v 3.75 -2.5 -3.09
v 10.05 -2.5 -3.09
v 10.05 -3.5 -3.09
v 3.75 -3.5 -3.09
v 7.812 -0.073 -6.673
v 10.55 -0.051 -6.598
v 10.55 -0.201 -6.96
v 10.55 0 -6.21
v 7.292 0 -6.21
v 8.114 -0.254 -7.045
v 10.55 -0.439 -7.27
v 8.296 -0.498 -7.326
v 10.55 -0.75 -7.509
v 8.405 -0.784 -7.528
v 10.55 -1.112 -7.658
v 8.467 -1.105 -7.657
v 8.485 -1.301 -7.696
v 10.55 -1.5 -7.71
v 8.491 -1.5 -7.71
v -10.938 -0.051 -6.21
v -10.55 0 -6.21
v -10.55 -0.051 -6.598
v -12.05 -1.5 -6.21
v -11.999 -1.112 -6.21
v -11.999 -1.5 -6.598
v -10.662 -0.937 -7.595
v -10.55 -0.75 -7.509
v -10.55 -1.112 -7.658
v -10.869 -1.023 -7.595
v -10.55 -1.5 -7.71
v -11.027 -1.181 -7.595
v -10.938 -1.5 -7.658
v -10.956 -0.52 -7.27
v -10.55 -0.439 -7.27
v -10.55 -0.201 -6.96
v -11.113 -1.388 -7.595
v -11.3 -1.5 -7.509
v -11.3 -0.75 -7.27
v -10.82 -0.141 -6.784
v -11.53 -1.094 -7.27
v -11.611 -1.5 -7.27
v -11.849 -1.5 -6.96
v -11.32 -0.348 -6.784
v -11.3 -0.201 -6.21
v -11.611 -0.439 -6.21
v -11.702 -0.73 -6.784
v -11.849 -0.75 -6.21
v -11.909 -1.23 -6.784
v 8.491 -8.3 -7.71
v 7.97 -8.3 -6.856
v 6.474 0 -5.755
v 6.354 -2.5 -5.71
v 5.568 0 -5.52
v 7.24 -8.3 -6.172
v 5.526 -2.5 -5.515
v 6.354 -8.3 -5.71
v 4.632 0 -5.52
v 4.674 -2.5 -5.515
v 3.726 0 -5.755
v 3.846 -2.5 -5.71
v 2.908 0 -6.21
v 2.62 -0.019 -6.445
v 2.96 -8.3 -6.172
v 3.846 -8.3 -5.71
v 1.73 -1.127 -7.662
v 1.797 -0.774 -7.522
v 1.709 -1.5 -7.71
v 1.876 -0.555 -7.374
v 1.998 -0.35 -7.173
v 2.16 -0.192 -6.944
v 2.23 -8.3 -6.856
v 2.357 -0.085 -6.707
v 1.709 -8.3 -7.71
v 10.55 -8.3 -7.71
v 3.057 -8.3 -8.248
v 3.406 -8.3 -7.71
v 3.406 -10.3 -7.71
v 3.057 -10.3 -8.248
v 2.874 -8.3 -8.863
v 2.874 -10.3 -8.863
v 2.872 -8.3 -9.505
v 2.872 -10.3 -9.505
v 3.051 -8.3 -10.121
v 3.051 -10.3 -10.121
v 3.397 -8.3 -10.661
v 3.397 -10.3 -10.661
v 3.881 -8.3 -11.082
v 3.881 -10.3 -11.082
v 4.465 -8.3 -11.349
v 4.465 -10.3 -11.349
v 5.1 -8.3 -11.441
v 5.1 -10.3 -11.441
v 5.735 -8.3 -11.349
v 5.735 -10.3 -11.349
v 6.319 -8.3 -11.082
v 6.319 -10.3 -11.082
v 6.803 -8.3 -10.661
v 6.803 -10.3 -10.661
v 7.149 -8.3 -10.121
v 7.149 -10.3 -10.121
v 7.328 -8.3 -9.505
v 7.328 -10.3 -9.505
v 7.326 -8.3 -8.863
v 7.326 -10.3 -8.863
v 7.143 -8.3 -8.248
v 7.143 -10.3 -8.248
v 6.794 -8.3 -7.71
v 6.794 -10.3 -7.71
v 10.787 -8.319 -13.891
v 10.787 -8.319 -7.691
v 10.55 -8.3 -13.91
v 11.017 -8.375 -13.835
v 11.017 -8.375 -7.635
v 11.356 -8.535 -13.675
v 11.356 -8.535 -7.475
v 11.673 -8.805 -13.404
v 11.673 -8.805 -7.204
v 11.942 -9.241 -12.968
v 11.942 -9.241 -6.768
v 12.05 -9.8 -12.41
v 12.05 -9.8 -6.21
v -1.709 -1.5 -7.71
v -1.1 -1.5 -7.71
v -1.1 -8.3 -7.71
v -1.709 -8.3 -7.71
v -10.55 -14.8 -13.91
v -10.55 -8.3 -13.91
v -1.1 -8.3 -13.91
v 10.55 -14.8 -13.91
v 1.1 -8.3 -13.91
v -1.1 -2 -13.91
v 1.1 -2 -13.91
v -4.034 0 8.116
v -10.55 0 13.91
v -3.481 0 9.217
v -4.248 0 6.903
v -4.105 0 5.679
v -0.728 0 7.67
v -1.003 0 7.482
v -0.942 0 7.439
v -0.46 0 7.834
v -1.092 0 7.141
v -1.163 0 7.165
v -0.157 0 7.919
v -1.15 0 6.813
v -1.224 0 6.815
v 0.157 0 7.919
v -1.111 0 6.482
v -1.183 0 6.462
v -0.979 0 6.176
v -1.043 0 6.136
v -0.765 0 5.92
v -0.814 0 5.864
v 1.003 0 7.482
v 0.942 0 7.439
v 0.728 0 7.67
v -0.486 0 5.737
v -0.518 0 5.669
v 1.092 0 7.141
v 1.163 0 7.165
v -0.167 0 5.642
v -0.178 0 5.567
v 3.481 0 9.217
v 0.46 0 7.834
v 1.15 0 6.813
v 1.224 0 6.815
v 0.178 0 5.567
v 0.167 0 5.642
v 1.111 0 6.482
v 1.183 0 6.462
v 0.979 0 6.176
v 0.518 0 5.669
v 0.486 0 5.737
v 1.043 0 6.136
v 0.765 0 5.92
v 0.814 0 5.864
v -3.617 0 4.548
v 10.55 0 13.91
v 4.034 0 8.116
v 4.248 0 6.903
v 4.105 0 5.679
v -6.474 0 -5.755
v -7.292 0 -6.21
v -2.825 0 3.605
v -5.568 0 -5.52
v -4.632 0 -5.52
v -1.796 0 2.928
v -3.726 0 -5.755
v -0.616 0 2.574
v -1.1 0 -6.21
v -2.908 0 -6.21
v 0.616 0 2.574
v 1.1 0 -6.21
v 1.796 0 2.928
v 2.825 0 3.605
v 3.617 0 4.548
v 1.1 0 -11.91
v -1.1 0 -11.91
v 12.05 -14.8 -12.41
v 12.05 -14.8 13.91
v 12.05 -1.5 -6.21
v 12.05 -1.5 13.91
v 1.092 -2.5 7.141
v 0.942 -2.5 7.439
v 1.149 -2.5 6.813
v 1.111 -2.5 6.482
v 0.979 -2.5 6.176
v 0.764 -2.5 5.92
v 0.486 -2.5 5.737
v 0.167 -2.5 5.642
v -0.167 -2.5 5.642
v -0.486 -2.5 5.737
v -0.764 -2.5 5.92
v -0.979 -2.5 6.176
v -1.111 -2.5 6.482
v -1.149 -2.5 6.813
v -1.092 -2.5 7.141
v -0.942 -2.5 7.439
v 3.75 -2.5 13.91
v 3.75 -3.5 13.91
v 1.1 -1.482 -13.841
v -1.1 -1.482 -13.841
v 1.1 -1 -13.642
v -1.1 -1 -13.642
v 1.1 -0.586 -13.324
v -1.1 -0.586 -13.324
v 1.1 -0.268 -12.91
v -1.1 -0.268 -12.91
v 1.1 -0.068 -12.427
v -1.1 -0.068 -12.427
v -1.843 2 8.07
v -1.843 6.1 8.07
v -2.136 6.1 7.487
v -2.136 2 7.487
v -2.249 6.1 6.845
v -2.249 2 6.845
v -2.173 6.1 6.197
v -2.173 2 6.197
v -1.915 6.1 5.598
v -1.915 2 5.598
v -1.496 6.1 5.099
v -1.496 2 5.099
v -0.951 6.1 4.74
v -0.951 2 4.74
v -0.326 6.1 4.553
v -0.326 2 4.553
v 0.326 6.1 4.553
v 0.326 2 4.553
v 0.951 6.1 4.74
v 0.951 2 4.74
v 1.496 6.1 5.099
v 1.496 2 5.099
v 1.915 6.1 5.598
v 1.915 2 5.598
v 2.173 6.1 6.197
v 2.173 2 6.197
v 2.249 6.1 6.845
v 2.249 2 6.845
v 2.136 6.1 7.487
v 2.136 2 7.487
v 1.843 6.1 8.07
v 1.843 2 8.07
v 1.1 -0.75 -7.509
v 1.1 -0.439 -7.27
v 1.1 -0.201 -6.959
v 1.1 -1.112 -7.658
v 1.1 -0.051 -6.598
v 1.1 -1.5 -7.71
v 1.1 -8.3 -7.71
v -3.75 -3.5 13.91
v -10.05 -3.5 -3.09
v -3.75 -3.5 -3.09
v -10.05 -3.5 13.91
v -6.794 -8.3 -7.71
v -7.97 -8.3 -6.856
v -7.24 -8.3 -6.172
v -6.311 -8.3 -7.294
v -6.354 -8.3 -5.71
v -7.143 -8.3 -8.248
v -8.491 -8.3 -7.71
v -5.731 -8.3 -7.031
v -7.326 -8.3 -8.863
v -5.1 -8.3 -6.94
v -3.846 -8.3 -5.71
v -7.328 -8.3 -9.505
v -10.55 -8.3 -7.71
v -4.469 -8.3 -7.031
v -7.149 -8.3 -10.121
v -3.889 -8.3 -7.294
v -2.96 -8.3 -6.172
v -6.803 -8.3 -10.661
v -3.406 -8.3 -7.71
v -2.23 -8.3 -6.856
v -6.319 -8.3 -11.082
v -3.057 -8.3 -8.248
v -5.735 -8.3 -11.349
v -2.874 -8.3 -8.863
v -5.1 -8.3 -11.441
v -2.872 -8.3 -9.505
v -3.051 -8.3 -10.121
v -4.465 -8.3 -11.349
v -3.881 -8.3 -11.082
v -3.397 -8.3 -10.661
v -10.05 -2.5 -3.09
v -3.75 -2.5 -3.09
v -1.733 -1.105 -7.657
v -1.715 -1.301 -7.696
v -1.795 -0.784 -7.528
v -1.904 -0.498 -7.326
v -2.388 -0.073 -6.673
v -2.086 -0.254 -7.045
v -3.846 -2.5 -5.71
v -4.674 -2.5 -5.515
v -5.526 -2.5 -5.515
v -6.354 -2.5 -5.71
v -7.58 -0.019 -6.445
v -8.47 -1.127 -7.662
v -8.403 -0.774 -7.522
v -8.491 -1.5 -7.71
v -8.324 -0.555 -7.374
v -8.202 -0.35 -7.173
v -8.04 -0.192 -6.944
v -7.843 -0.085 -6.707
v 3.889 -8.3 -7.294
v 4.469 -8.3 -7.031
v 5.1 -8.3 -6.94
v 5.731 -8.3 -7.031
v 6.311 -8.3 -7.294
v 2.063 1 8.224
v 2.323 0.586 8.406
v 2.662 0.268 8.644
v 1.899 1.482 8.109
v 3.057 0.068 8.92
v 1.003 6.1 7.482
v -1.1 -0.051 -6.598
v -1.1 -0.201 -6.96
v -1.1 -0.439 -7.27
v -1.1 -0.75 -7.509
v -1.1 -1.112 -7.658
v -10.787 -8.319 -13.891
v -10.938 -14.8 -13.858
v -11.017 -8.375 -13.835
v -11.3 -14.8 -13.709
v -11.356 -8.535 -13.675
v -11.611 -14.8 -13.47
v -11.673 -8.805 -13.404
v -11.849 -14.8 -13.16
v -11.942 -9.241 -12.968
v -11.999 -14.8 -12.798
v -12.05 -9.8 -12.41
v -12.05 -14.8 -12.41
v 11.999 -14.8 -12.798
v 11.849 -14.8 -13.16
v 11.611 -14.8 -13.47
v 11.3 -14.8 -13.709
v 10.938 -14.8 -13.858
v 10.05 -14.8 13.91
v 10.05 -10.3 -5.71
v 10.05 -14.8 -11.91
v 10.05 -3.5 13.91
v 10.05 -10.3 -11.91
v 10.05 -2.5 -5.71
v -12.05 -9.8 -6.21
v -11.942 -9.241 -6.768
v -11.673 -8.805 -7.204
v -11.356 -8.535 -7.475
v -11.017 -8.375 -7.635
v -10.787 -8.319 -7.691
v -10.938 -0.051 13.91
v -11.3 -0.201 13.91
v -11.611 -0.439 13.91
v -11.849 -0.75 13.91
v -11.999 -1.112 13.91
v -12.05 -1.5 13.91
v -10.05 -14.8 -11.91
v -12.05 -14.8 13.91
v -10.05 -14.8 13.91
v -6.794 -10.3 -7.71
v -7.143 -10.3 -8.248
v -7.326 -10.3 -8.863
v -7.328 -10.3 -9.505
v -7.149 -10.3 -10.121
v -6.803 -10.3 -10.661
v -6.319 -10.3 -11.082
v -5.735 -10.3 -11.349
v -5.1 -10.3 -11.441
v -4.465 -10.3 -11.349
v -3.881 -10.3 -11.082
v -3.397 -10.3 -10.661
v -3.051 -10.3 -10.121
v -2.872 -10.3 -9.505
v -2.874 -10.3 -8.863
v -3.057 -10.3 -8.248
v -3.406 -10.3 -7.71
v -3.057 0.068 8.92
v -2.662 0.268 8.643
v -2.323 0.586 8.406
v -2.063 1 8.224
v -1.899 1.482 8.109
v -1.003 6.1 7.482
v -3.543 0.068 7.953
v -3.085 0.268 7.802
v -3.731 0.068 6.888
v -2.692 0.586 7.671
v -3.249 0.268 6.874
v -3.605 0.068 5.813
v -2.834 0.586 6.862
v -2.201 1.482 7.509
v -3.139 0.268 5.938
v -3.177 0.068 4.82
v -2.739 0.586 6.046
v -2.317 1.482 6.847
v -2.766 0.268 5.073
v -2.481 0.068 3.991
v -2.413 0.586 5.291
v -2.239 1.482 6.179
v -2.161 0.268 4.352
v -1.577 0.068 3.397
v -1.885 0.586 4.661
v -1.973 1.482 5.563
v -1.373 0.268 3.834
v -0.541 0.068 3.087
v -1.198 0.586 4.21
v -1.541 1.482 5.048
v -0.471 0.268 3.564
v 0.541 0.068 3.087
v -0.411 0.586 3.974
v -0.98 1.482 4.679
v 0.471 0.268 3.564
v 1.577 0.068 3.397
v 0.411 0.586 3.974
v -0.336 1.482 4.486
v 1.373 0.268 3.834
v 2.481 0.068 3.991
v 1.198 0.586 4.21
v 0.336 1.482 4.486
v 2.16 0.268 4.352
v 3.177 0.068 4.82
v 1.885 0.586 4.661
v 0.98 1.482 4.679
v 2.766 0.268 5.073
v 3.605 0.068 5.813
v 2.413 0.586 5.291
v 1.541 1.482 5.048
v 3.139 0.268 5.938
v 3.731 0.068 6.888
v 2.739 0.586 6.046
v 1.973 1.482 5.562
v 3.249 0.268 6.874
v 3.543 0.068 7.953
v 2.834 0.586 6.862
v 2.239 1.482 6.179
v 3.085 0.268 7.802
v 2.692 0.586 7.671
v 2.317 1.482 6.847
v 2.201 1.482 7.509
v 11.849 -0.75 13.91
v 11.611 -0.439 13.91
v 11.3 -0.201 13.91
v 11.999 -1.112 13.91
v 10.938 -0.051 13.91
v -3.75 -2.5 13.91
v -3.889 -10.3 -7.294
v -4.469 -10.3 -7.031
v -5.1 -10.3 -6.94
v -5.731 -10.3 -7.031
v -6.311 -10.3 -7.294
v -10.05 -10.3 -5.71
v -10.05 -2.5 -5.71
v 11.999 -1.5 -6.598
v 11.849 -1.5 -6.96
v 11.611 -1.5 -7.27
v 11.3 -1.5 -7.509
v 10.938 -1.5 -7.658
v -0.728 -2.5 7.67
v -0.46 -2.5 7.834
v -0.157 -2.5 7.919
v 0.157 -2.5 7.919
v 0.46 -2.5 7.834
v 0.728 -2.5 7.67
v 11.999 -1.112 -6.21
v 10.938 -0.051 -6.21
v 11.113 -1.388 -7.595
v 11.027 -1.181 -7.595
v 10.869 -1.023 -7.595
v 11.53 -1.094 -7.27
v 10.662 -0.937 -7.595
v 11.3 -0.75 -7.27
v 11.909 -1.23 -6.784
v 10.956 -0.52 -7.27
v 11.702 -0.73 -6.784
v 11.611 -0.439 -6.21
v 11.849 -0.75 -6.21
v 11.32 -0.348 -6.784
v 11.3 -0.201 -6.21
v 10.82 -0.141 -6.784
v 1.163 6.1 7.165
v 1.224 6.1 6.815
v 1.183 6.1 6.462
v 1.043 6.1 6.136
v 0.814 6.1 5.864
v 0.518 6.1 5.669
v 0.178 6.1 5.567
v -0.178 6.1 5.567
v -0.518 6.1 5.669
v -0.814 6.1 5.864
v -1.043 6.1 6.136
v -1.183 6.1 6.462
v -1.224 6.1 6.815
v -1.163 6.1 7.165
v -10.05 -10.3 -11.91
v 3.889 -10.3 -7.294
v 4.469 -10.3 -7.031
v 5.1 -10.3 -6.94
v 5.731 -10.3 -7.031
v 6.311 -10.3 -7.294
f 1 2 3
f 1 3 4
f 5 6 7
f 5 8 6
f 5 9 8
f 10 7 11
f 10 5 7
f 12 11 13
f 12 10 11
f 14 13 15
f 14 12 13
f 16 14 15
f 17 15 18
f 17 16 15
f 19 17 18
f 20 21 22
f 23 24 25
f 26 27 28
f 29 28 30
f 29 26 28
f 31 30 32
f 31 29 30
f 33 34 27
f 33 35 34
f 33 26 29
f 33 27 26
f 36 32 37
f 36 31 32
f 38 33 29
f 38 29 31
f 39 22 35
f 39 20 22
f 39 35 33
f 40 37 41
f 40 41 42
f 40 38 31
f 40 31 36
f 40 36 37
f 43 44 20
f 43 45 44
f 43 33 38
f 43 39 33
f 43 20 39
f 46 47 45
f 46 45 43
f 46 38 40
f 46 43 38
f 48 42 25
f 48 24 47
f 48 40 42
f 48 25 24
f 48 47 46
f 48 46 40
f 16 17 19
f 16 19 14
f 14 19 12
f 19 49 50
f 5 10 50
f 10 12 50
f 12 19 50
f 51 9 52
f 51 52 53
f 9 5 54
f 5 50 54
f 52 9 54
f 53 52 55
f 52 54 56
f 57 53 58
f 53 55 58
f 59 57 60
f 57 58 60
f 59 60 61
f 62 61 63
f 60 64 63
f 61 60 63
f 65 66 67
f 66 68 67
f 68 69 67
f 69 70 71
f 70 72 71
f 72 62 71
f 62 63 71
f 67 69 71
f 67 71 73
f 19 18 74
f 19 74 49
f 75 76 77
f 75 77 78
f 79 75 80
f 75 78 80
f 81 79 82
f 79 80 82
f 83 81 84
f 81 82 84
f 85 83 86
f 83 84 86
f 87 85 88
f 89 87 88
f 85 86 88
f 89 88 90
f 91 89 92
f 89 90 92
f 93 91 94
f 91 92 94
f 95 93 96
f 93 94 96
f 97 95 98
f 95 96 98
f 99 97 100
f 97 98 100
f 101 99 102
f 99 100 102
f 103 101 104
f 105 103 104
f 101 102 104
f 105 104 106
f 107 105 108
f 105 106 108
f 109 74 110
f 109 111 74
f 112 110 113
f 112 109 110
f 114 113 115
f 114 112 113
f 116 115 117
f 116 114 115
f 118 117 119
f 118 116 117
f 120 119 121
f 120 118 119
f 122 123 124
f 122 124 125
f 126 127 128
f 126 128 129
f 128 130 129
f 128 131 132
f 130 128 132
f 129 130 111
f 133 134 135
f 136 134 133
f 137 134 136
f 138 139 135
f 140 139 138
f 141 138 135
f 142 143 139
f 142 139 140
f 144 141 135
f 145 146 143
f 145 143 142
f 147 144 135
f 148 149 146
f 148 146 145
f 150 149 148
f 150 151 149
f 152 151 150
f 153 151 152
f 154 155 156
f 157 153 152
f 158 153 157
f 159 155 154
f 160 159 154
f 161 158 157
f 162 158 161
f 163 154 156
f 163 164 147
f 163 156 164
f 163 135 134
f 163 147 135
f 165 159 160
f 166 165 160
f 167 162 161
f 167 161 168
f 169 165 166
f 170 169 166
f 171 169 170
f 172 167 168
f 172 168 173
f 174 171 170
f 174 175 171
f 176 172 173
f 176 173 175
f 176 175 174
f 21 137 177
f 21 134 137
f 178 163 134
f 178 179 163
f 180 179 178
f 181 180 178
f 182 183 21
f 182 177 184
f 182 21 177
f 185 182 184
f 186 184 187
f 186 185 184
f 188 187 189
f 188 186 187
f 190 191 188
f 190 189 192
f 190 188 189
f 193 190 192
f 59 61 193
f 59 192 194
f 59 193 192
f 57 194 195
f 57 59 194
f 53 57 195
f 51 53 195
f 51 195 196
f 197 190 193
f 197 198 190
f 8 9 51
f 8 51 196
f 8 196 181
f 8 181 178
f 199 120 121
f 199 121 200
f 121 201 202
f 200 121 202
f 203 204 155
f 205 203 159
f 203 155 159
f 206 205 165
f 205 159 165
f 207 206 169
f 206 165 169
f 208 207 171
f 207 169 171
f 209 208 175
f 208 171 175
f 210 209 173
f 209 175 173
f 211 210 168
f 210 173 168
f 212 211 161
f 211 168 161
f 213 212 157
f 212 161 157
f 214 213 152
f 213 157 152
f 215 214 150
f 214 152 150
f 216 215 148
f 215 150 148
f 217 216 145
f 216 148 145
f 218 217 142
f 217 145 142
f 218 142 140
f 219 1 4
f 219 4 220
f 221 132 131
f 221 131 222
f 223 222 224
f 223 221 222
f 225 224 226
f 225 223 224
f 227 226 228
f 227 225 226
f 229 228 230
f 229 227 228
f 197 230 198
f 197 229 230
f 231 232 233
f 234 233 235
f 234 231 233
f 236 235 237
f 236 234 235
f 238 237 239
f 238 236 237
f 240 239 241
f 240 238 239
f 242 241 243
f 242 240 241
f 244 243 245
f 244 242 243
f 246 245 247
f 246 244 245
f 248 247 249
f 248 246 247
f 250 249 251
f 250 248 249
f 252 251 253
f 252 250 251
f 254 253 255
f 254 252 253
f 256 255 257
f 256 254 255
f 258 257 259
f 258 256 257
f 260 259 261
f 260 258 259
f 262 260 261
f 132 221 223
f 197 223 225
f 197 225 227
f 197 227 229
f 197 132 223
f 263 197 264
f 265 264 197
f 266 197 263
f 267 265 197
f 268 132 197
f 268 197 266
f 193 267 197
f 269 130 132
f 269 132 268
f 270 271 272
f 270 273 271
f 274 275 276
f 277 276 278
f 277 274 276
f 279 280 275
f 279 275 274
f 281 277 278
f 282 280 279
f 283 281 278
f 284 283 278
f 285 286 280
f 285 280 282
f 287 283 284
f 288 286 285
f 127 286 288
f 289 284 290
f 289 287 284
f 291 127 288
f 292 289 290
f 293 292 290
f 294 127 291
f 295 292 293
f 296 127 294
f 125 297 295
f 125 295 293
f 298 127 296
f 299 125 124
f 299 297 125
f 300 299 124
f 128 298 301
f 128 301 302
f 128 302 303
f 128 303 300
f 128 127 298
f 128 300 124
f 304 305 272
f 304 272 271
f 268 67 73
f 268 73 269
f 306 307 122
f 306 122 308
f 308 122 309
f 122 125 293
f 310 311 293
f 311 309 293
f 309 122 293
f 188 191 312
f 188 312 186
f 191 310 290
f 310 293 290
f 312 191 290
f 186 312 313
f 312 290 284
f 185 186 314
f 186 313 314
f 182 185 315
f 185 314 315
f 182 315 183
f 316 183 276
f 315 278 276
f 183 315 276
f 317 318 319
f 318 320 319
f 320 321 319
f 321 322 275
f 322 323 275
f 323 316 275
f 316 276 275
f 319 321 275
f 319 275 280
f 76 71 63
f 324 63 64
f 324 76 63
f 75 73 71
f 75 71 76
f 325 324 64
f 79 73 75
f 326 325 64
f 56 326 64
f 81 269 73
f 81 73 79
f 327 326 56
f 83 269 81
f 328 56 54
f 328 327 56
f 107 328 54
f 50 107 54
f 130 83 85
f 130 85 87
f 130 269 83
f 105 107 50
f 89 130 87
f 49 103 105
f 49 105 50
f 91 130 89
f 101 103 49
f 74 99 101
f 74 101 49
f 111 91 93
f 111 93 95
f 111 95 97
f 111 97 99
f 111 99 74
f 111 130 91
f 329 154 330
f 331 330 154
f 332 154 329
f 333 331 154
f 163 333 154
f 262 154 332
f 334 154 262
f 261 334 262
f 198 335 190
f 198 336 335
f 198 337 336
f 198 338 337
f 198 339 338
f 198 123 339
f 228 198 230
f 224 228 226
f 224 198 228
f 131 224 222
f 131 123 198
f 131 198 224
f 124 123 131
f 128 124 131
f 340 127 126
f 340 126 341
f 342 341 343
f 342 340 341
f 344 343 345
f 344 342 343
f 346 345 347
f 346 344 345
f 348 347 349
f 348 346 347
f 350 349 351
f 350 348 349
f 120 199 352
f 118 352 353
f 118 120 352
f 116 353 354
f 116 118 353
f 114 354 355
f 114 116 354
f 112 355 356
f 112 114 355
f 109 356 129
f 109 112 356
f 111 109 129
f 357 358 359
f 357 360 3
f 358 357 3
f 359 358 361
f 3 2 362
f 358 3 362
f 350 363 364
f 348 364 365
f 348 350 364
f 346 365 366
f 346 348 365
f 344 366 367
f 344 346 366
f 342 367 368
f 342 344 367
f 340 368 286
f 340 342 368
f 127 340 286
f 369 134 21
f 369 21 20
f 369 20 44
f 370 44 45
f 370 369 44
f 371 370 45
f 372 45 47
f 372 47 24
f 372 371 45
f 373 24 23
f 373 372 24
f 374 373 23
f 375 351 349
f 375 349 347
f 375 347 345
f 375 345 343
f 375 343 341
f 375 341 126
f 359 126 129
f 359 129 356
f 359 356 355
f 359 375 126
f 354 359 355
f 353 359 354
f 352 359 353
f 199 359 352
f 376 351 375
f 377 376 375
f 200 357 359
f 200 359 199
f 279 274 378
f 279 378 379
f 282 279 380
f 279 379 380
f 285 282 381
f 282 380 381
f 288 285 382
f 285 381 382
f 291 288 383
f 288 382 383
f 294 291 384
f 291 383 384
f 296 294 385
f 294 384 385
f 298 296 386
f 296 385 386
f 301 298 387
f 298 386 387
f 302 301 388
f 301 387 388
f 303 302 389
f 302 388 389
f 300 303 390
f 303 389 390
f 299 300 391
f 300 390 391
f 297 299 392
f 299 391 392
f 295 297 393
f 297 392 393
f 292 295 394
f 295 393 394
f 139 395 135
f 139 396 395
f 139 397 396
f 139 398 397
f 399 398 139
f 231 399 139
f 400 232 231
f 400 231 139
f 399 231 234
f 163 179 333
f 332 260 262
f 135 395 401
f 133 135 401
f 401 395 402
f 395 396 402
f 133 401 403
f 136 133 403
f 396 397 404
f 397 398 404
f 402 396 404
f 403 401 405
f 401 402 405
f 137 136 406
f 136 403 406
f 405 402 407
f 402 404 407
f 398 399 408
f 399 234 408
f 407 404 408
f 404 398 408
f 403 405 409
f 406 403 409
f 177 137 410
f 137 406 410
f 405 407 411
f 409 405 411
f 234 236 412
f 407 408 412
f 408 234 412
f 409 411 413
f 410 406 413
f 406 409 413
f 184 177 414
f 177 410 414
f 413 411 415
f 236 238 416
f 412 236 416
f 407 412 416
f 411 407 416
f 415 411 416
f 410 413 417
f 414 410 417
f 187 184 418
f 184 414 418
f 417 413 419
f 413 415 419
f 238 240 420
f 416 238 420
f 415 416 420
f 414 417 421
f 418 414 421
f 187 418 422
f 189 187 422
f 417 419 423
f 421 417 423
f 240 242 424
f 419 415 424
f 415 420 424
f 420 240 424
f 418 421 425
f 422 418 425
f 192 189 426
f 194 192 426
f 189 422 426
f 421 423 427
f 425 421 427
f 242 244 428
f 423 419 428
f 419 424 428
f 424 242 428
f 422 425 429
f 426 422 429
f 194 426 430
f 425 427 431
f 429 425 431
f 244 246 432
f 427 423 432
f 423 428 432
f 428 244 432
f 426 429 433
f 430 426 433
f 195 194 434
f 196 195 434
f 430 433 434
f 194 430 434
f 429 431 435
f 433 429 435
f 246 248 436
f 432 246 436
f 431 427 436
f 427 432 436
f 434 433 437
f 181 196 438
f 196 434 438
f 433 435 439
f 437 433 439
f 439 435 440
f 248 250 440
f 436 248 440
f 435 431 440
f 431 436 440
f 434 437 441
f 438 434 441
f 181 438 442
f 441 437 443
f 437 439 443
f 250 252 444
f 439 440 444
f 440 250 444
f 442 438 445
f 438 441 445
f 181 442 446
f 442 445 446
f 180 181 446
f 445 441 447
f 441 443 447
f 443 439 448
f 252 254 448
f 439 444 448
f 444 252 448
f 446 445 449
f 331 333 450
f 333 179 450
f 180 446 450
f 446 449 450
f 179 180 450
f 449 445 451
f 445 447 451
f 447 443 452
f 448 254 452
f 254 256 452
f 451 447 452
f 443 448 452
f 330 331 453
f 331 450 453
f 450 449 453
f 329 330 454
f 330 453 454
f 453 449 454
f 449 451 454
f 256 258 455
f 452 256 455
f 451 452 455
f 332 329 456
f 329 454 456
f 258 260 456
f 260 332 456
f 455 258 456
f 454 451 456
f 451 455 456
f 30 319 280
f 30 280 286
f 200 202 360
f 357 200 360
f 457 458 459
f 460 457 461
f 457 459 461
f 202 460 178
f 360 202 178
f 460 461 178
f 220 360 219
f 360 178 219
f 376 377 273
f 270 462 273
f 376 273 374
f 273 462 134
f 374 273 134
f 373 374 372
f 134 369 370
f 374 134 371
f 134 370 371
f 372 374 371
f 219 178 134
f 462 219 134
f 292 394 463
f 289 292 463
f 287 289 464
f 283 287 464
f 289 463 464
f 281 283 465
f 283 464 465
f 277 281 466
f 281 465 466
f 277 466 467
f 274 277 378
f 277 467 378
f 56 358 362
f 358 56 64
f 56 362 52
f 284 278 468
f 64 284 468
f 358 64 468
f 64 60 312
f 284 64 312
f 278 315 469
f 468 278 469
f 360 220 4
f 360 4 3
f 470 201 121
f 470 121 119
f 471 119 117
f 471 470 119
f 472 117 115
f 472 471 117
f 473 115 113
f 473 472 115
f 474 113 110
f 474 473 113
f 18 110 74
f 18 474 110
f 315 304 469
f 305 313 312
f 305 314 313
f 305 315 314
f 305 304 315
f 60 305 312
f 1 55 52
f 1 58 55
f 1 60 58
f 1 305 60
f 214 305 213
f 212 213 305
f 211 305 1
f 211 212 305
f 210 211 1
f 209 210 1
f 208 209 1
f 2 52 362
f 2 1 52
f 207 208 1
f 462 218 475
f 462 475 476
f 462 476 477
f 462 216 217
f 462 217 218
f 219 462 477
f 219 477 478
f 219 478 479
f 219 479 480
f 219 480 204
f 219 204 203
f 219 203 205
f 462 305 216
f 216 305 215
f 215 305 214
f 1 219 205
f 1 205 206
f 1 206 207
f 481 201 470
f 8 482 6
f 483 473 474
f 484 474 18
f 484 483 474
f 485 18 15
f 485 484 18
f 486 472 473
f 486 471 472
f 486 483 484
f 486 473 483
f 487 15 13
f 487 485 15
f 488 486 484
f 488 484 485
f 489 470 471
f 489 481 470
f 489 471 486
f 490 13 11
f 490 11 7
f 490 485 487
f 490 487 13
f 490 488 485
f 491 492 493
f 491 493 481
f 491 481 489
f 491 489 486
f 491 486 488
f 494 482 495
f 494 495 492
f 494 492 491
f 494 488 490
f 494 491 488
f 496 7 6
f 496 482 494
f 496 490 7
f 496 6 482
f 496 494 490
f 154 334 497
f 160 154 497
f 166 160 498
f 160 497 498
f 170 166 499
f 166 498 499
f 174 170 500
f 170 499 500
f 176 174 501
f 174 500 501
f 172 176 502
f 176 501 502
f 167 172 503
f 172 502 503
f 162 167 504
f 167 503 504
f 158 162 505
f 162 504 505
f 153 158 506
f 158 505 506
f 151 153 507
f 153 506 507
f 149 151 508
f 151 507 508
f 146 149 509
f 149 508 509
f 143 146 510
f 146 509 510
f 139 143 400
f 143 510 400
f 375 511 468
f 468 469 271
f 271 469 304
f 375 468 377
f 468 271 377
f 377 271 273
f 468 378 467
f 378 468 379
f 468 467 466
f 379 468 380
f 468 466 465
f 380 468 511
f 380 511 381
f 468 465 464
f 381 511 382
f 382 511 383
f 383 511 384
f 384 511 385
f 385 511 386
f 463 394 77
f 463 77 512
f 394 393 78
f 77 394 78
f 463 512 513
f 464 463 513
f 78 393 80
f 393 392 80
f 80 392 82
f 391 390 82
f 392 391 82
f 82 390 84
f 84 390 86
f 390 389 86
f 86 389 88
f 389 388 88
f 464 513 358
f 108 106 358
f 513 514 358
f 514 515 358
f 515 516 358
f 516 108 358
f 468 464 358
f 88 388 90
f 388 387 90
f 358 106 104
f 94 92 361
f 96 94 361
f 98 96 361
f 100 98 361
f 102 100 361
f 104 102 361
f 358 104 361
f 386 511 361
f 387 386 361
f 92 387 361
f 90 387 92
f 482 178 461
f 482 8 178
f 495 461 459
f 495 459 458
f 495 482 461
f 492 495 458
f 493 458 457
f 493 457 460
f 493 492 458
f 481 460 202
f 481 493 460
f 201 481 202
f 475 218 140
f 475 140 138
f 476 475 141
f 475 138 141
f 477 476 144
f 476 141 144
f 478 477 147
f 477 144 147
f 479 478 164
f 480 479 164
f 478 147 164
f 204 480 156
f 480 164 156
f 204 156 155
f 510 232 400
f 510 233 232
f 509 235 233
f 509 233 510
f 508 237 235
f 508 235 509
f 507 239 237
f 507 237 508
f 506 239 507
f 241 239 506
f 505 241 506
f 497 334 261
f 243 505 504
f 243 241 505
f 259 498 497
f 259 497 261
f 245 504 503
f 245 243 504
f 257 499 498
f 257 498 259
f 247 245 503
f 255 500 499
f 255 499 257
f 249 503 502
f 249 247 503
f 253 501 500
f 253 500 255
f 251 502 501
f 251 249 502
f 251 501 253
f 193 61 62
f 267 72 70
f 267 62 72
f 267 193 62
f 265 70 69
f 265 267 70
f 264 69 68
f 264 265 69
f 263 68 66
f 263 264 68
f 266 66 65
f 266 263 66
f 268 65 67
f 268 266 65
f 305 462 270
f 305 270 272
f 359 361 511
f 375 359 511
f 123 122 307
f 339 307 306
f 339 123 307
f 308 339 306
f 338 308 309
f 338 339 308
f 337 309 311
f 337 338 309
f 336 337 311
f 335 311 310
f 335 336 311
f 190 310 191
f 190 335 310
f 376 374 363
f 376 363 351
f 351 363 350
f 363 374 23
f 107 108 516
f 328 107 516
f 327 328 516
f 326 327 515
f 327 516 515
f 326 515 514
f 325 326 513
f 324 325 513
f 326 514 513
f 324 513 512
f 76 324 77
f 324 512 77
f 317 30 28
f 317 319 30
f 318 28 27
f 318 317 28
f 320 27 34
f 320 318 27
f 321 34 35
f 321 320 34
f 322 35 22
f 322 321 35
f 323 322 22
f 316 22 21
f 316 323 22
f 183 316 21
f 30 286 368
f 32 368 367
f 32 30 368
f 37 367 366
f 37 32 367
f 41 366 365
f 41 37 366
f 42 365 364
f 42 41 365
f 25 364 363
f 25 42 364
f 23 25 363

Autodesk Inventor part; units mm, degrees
ref_plane "YZ Plane" through (0, 0, 0) normal (1, 0, 0) x (0, 1, 0)
ref_plane "XZ Plane" through (0, 0, 0) normal (0, 1, 0) x (-1, 0, 0)
sketch "Sketch1" plane through (0, 0, 0) normal (0, 1, 0) x (-1, 0, 0)
  line L0 (12.05, 13.9095) -> (-12.05, 13.9095)
  line L1 (-12.05, 13.9095) -> (-12.05, -13.9095)
  line L2 (-12.05, -13.9095) -> (12.05, -13.9095)
  line L3 (12.05, -13.9095) -> (12.05, 13.9095)
  point P0 (0, 0)
  dimension "d0" = 24.1
  dimension "d1" = 12.05
  dimension "d2" = 27.819
  dimension "d3" = 13.9095
extrude "Extrusion1" add sketch "Sketch1" against normal blind 13.3
sketch "Sketch2" plane through (0, -13.3, 0) normal (0, -1, 0) x (1, 0, 0)
  line L0 (10.05, 13.9095) -> (-10.05, 13.9095)
  line L1 (-10.05, 13.9095) -> (-10.05, -11.9095)
  line L2 (-10.05, -11.9095) -> (10.05, -11.9095)
  line L3 (10.05, -11.9095) -> (10.05, 13.9095)
  line L4 (12.05, 13.9095) -> (-12.05, 13.9095) projected
  line L5 (12.05, -13.9095) -> (12.05, 13.9095) projected
  line L6 (-12.05, 13.9095) -> (-12.05, -13.9095) projected
  line L7 (-12.05, -13.9095) -> (12.05, -13.9095) projected
  point P0 (0, 0)
  dimension "d6" = 2
  dimension "d7" = 2
  dimension "d8" = 2
extrude "Extrusion2" cut sketch "Sketch2" against normal blind 10.8 contours L3 L2 L1 L0
sketch "Sketch3" plane through (0, 0, 0) normal (0, 1, 0) x (1, 0, 0)
  line L0 (-12.05, 5.7095) -> (12.05, 5.7095)
  line L1 (12.05, 5.7095) -> (12.05, 13.9095)
  line L2 (12.05, 13.9095) -> (-12.05, 13.9095)
  line L3 (-12.05, 13.9095) -> (-12.05, 5.7095)
  point P0 (0, 0)
  dimension "d11" = 8.2
extrude "Extrusion3" cut sketch "Sketch3" against normal blind 10.3
sketch "Sketch4" plane through (0, -10.3, 0) normal (0, 1, 0) x (1, 0, 0)
  line L0 (-1.1, 5.7095) -> (-12.05, 5.7095)
  line L1 (-12.05, 5.7095) -> (-12.05, 13.9095)
  line L2 (-12.05, 13.9095) -> (-1.1, 13.9095)
  line L3 (-1.1, 13.9095) -> (-1.1, 5.7095)
  point P0 (0, 0)
  dimension "d14" = 10.95
extrude "Extrusion4" add sketch "Sketch4" along normal blind 2
mirror "Mirror1" about plane through (0, 0, 0) normal (1, 0, 0) of "Extrusion4"
sketch "Sketch6" plane through (0, -13.3, 0) normal (0, -1, 0) x (1, 0, 0)
  line L0 (-12.05, -5.7095) -> (12.05, -5.7095)
  line L1 (12.05, -5.7095) -> (12.05, -13.9095)
  line L2 (12.05, -13.9095) -> (-12.05, -13.9095)
  line L3 (-12.05, -13.9095) -> (-12.05, -5.7095)
  point P0 (0, 0)
extrude "Extrusion6" add sketch "Sketch6" along normal blind 2
sketch "Sketch7" plane through (12.05, 0, -5.7095) normal (0, 0, -1) x (-1, 0, 0)
  line L0 (0, 0) -> (10.95, 0)
  line L1 (10.95, 0) -> (10.95, -8.3)
  line L2 (10.95, -8.3) -> (0, -8.3)
  line L3 (0, -8.3) -> (0, 0)
  point P0 (12.05, 0)
extrude "Extrusion7" add sketch "Sketch7" along normal blind 2
mirror "Mirror3" about plane through (0, 0, 0) normal (1, 0, 0) of "Extrusion7"
sketch "Sketch8" plane through (1.1, -8.3, -13.9095) normal (0, 1, 0) x (1, 0, 0)
  circle A0 centre (4, -4.719) radius 2.25
  line L0 (0, -8.2) -> (8.95, -8.2) projected
  line L1 (8.95, -27.819) -> (8.95, -8.2) projected
  line L2 (10.95, -27.819) -> (10.95, -6.2) projected
  line L3 (8.95, -2) -> (0, -2) projected
  point P0 (-1.1, -13.9095)
  dimension "d24" = 4.5
  dimension "d29" = 6.95
  dimension "d30" = 2.719
extrude "Extrusion8" cut sketch "Sketch8" against normal through all
mirror "Mirror4" about plane through (0, 0, 0) normal (1, 0, 0) of "Extrusion8"
sketch "Sketch9" plane through (0, 0, 0) normal (0, 1, 0) x (1, 0, 0)
  circle A0 centre (0, -6.7795) radius 1.15
  line L0 (-12.05, -13.9095) -> (12.05, -13.9095) projected
  circle A1 centre (0, -6.7795) radius 2.25
  point P0 (0, 0)
  dimension "d31" = 7.13
  dimension "d32" = 2.3
  dimension "d33" = 4.5
extrude "Extrusion9" add sketch "Sketch9" along normal blind 6.1
sketch "Sketch10" plane through (0, 6.1, 6.7795) normal (0, 1, 0) x (1, 0, 0)
  circle A0 centre (0, 0) radius 1.15 projected
  arc A1 (-0.942, -0.6596) -> (0.942, -0.6596) centre (0, 0) ccw
  circle A2 centre (0, 0) radius 2.25 projected
  arc A3 (-1.8431, -1.2905) -> (1.8431, -1.2905) centre (0, 0) ccw
  line L0 (0, 0) -> (-0.8052, 0)
  line L1 (0, 0) -> (0.4727, 0)
  line L2 (0, 0) -> (-0.942, -0.6596)
  line L3 (0, 0) -> (0.942, -0.6596)
  line L4 (-1.8431, -1.2905) -> (-0.942, -0.6596)
  line L5 (0.942, -0.6596) -> (1.8431, -1.2905)
  point P0 (0, 6.7795)
  dimension "d36" = 35
  dimension "d37" = 35
extrude "Extrusion10" cut sketch "Sketch10" against normal up to surface (6.1 mm away) contours A0 L5 A2 L4 picked at (-0.2694, -1.8509)
sketch "Sketch11" plane through (0, 0, 0) normal (0, 1, 0) x (1, 0, 0)
  line L0 (1.1, 5.7095) -> (-1.1, 5.7095) projected
  line L1 (-1.1, 5.7095) -> (-1.1, 7.7095) projected
  line L2 (-1.1, 7.7095) -> (-12.05, 7.7095) projected
  line L3 (-12.05, 7.7095) -> (-12.05, -13.9095) projected
  line L4 (-12.05, -13.9095) -> (12.05, -13.9095) projected
  line L5 (12.05, -13.9095) -> (12.05, 7.7095) projected
  line L6 (1.1, 7.7095) -> (12.05, 7.7095) projected
  line L7 (1.1, 5.7095) -> (1.1, 7.7095) projected
  arc A0 (0.942, -7.4391) -> (-0.942, -7.4391) centre (0, -6.7795) ccw projected
  line L8 (-0.942, -7.4391) -> (-1.8431, -8.07) projected
  arc A1 (1.8431, -8.07) -> (-1.8431, -8.07) centre (0, -6.7795) ccw projected
  line L9 (1.8431, -8.07) -> (0.942, -7.4391) projected
  circle A2 centre (0, -6.7795) radius 1.15
  point P0 (0, 0)
extrude "Extrusion11" cut sketch "Sketch11" against normal through all contours A2 A0
fillet "Fillet1" radius 2 1 edges at (0, 0, 4.5295)
fillet "Fillet2" radius 1.5 10 edges at (12.05, 0, 3.1) (-12.05, 0, 3.1) (6.575, 0, -7.7095) (-6.575, 0, -7.7095) (12.05, -4.15, -7.7095) (12.05, -8.3, -10.8095) (12.05, -11.8, -13.9095) (-12.05, -11.8, -13.9095) (-12.05, -8.3, -10.8095) (-12.05, -4.15, -7.7095)
sketch "Sketch12" plane through (0, -8.3, 0) normal (0, 1, 0) x (1, 0, 0)
  arc A0 (-3.4061, 7.7095) -> (-6.7939, 7.7095) centre (-5.1, 9.1905) ccw projected
  arc A1 (6.7939, 7.7095) -> (3.4061, 7.7095) centre (5.1, 9.1905) ccw projected
  circle A2 centre (-5.1, 9.1905) radius 2.25
  circle A3 centre (5.1, 9.1905) radius 2.25
  point P0 (0, 0)
extrude "Extrusion12" cut sketch "Sketch12" along normal through all both and the other way through all
sketch "Sketch13" plane through (0, -8.3, 0) normal (0, 1, 0) x (1, 0, 0)
  arc A0 (-3.4061, 7.7095) -> (-6.7939, 7.7095) centre (-5.1, 9.1905) ccw projected
  circle A1 centre (-5.1, 9.1905) radius 3.7
  arc A2 (6.7939, 7.7095) -> (3.4061, 7.7095) centre (5.1, 9.1905) ccw projected
  circle A3 centre (5.1, 9.1905) radius 3.7
  point P0 (0, 0)
  dimension "d46" = 7.4
  dimension "d47" = 7.4
extrude "Extrusion13" cut sketch "Sketch13" along normal through all
sketch "Sketch14" plane through (-10.05, -13.3, -5.7095) normal (0, 0, 1) x (1, 0, 0)
  line L0 (-2, 0) -> (22.1, 0)
  line L1 (22.1, 0) -> (22.1, -2)
  line L2 (22.1, -2) -> (-2, -2)
  line L3 (-2, -2) -> (-2, 0)
  point P0 (10.05, 13.3)
extrude "Extrusion14" cut sketch "Sketch14" along normal through all both and the other way through all
sketch "Sketch16" plane through (0, -13.3, 0) normal (0, -1, 0) x (1, 0, 0)
  line L0 (12.05, -12.4095) -> (12.05, 13.9095) projected
  line L1 (12.05, 13.9095) -> (10.05, 13.9095) projected
  line L2 (10.05, 13.9095) -> (10.05, -11.9095) projected
  line L3 (10.05, -11.9095) -> (-10.05, -11.9095) projected
  line L4 (-10.05, -11.9095) -> (-10.05, 13.9095) projected
  line L5 (-10.05, 13.9095) -> (-12.05, 13.9095) projected
  line L6 (-12.05, 13.9095) -> (-12.05, -12.4095) projected
  arc A0 (-12.05, -12.4095) -> (-10.55, -13.9095) centre (-10.55, -12.4095) ccw projected
  line L7 (10.55, -13.9095) -> (-10.55, -13.9095) projected
  arc A1 (10.55, -13.9095) -> (12.05, -12.4095) centre (10.55, -12.4095) ccw projected
  point P0 (0, 0)
extrude "Extrusion16" add sketch "Sketch16" along normal blind 1
sketch "Sketch17" plane through (0, -2.5, 0) normal (0, -1, 0) x (1, 0, 0)
  line L0 (10.05, -3.0905) -> (3.75, -3.0905)
  line L1 (3.75, -3.0905) -> (3.75, 13.9095)
  line L2 (3.75, 13.9095) -> (10.05, 13.9095)
  line L3 (10.05, 13.9095) -> (10.05, -3.0905)
  line L4 (-3.75, -3.0905) -> (-10.05, -3.0905)
  line L5 (-10.05, -3.0905) -> (-10.05, 13.9095)
  line L6 (-10.05, 13.9095) -> (-3.75, 13.9095)
  line L7 (-3.75, 13.9095) -> (-3.75, -3.0905)
  point P0 (0, 0)
  dimension "d57" = 7.5
  dimension "d58" = 6.3
  dimension "d59" = 17
extrude "Extrusion17" add sketch "Sketch17" along normal blind 1
sketch "Sketch18" plane through (0, -10.3, 0) normal (0, 1, 0) x (1, 0, 0)
  arc A0 (2.9083, 6.2095) -> (7.2917, 6.2095) centre (5.1, 9.1905) ccw projected
  arc A1 (-7.2917, 6.2095) -> (-2.9083, 6.2095) centre (-5.1, 9.1905) ccw projected
  line L0 (-1.1, 13.9095) -> (1.1, 13.9095)
  line L1 (1.1, 13.9095) -> (1.1, 5.7095)
  line L2 (1.1, 5.7095) -> (-1.1, 5.7095)
  line L3 (-1.1, 5.7095) -> (-1.1, 13.9095)
  point P0 (0, 0)
  point P1 (-1.7093, 7.7095)
extrude "Extrusion18" add sketch "Sketch18" along normal up to surface (10.3 mm away)
fillet "Fillet3" radius 2 1 edges at (0, 0, -13.9095)
sketch "Sketch19" plane through (0, 6.1, 0) normal (0, 1, 0) x (1, 0, 0)
  arc A0 (0.942, -7.4391) -> (-0.942, -7.4391) centre (0, -6.7795) ccw projected
  circle A1 centre (0, -6.7795) radius 1.225
  point P0 (0, 0)
  dimension "d65" = 2.45
extrude "Extrusion19" cut sketch "Sketch19" against normal up to surface (6.1 mm away)
sketch "Sketch20" plane through (0, 6.1, 0) normal (0, 1, 0) x (1, 0, 0)
  arc A0 (1.0035, -7.4821) -> (-1.0035, -7.4821) centre (0, -6.7795) ccw projected
  line L0 (1.0035, -7.4821) -> (1.8431, -8.07) projected
  arc A1 (1.8431, -8.07) -> (-1.8431, -8.07) centre (0, -6.7795) ccw projected
  line L1 (-1.8431, -8.07) -> (-1.0035, -7.4821) projected
  point P0 (0, 0)
extrude "Extrusion20" [suppressed]
ref_plane "Work Plane1" through (0, 2, 0) normal (0, 1, 0) x (1, 0, 0)
sketch "Sketch22" plane through (0, -14.3, 0) normal (0, -1, 0) x (1, 0, 0)
  line L0 (12.05, -12.4095) -> (12.05, 13.9095) projected
  line L1 (12.05, 13.9095) -> (10.05, 13.9095) projected
  line L2 (10.05, 13.9095) -> (10.05, -11.9095) projected
  line L3 (10.05, -11.9095) -> (-10.05, -11.9095) projected
  line L4 (-10.05, -11.9095) -> (-10.05, 13.9095) projected
  line L5 (-10.05, 13.9095) -> (-12.05, 13.9095) projected
  line L6 (-12.05, 13.9095) -> (-12.05, -12.4095) projected
  arc A0 (-12.05, -12.4095) -> (-10.55, -13.9095) centre (-10.55, -12.4095) ccw projected
  line L7 (-10.55, -13.9095) -> (10.55, -13.9095) projected
  arc A1 (10.55, -13.9095) -> (12.05, -12.4095) centre (10.55, -12.4095) ccw projected
  point P0 (0, 0)
extrude "Extrusion22" add sketch "Sketch22" along normal blind 0.5
equation "\"d1\" = 0.5 * d0"
equation "\"d3\" = 0.5 * d2"
equation "\"d37\" = d36"
properties part number "cover_dis"
